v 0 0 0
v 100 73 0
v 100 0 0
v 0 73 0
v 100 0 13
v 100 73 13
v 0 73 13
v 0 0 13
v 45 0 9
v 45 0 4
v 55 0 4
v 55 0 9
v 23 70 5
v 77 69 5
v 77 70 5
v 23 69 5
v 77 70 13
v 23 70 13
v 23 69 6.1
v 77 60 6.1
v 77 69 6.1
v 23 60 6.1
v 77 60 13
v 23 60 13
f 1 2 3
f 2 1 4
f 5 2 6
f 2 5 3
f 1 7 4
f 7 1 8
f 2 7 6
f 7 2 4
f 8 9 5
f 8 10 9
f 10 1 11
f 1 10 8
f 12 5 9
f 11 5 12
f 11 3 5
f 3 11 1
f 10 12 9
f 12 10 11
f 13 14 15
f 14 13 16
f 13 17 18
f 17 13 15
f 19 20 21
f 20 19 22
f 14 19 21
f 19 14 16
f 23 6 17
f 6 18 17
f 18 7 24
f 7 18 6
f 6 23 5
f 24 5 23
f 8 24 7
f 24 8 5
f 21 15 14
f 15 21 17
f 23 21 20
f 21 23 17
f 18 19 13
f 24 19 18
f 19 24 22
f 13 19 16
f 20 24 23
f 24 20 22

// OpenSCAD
// ==================================================
// Inky Impression 4" Lanyard Case with GPIO Cutout,
// Display Window, and Button Cutouts
// ==================================================
//
// Description:
// A 3D-printed case designed to house the Inky Impression 4" e-paper display.
// Features include a lanyard loop, GPIO cutout for Raspberry Pi HAT connector,
// a transparent display window, and button cutouts.
//
// Author: Zitterbewegung 
// LLM: ChatGPT-o1-preview and mini o1.
// Date: 2024-04-27
// ==================================================

// -------------------
// Parameters Section
// -------------------

// Device dimensions (in millimeters)
// Please verify and adjust these dimensions according to your specific device
device_width = 94;       // Width of the Inky Impression
device_height = 67;      // Height of the Inky Impression
device_thickness = 10;   // Thickness of the Inky Impression (including components)

// Case parameters
wall_thickness = 3;      // Thickness of the case walls
lip_height = 2;          // Height of the inner lip to hold the device
tolerance = 0.5;         // General tolerance for fit

// Lanyard loop dimensions
loop_width = 10;         // Width of the lanyard loop
loop_height = 5;         // Height of the lanyard loop
loop_thickness = 3;      // Thickness of the lanyard loop

// GPIO cutout dimensions
gpio_cutout_width = 54;      // Width of the GPIO cutout (slightly wider than the header)
gpio_cutout_height = 10;     // Height of the GPIO cutout
gpio_cutout_depth = device_thickness + wall_thickness; // Depth of the cutout

// GPIO cutout position (relative to the back cover)
gpio_cutout_x = (device_width + 2 * wall_thickness - gpio_cutout_width) / 2; // Centered horizontally
gpio_cutout_y = device_height + wall_thickness - gpio_cutout_height;       // Positioned near the top

// Display window parameters
window_margin = 1;              // Margin around the display opening for the window
window_thickness = 1.5;         // Thickness of the display window
window_material_overhang = 0.5; // Overhang for the window to snap or clip into place

// Button cutout parameters
// Define each button's position and size
// Adjust these based on your device's button layout
button_count = 3; // Number of buttons

// Example positions (relative to the front of the device)
// Modify these values to match your device's button layout
button_positions = [
    [20, 5],   // Button 1: [x, y] from the bottom-left corner
    [47, 5],   // Button 2
    [74, 5]    // Button 3
];

button_radius = 3;    // Radius of the circular button cutouts
button_height = wall_thickness + 0.2; // Slightly taller than wall to ensure clearance

// =======================
// Modules Definition
// =======================

// Front Frame Module with Display Window Slot and Button Cutouts
module front_frame() {
    difference() {
        // Outer frame
        cube([device_width + 2 * wall_thickness, device_height + 2 * wall_thickness, wall_thickness], center=false);
        
        // Inner cutout for the display
        translate([wall_thickness, wall_thickness, -1])
            cube([device_width, device_height, wall_thickness + 2]);
        
        // Button cutouts
        for (i = [0 : button_count - 1]) {
            translate([
                wall_thickness + button_positions[i][0] - button_radius,
                wall_thickness + button_positions[i][1] - button_radius,
                0
            ])
                cylinder(h = button_height, r = button_radius, $fn=100);
        }
    }
    
    // Inner lip to hold the device
    translate([wall_thickness, wall_thickness, wall_thickness])
        cube([device_width, device_height, lip_height]);
    
    // Display window slot
    translate([wall_thickness + window_margin, wall_thickness + window_margin, wall_thickness - 0.1])
        cube([device_width - 2 * window_margin, device_height - 2 * window_margin, wall_thickness + 0.2]);
}

// Back Cover Module with GPIO Cutout
module back_cover() {
    difference() {
        // Main back cover
        cube([device_width + 2 * wall_thickness, device_height + 2 * wall_thickness, device_thickness + wall_thickness], center=false);
        
        // Lanyard loop
        translate([(device_width + 2 * wall_thickness - loop_width) / 2, -loop_thickness, (device_thickness + wall_thickness) / 2 - loop_height / 2])
            cube([loop_width, loop_thickness, loop_height], center=false);
        
        // GPIO cutout
        translate([gpio_cutout_x, gpio_cutout_y, wall_thickness + lip_height - 1]) // Slight offset in Z for clean cut
            cube([gpio_cutout_width, gpio_cutout_height, gpio_cutout_depth + 2], center=false);
    }
}

// Display Window Module
module display_window() {
    // This module is for reference and should be printed separately or cut from a transparent sheet
    // If printing as part of the case, ensure the material is transparent
    // For best results, use a separate acrylic sheet inserted into the slot
    difference() {
        // Outer window piece
        cube([device_width - 2 * window_margin + 2 * window_material_overhang, 
              device_height - 2 * window_margin + 2 * window_material_overhang, 
              window_thickness], center=false);
        
        // Hole for window mounting (if using clips)
        // Customize based on your mounting method
    }
}

// =======================
// Assembly Section
// =======================

module assemble_case() {
    // Front Frame with Display Window Slot and Button Cutouts
    front_frame();
    
    // Back Cover with GPIO Cutout
    back_cover();
    
    // Uncomment the following line to include a hinged display window (requires additional design)
    // hinge_front_frame();
}

// Render the assembled case
assemble_case();

// =======================
// Optional: Customization
// =======================

// Uncomment the following lines to add text or logos to the case
/*
module add_text() {
    translate([wall_thickness, device_height + wall_thickness + 5, wall_thickness + lip_height + 1])
        linear_extrude(height=2)
            text("Inky Impression", size=10, valign="center", halign="center");
}

add_text();
*/

// =======================
// End of File
// =======================
